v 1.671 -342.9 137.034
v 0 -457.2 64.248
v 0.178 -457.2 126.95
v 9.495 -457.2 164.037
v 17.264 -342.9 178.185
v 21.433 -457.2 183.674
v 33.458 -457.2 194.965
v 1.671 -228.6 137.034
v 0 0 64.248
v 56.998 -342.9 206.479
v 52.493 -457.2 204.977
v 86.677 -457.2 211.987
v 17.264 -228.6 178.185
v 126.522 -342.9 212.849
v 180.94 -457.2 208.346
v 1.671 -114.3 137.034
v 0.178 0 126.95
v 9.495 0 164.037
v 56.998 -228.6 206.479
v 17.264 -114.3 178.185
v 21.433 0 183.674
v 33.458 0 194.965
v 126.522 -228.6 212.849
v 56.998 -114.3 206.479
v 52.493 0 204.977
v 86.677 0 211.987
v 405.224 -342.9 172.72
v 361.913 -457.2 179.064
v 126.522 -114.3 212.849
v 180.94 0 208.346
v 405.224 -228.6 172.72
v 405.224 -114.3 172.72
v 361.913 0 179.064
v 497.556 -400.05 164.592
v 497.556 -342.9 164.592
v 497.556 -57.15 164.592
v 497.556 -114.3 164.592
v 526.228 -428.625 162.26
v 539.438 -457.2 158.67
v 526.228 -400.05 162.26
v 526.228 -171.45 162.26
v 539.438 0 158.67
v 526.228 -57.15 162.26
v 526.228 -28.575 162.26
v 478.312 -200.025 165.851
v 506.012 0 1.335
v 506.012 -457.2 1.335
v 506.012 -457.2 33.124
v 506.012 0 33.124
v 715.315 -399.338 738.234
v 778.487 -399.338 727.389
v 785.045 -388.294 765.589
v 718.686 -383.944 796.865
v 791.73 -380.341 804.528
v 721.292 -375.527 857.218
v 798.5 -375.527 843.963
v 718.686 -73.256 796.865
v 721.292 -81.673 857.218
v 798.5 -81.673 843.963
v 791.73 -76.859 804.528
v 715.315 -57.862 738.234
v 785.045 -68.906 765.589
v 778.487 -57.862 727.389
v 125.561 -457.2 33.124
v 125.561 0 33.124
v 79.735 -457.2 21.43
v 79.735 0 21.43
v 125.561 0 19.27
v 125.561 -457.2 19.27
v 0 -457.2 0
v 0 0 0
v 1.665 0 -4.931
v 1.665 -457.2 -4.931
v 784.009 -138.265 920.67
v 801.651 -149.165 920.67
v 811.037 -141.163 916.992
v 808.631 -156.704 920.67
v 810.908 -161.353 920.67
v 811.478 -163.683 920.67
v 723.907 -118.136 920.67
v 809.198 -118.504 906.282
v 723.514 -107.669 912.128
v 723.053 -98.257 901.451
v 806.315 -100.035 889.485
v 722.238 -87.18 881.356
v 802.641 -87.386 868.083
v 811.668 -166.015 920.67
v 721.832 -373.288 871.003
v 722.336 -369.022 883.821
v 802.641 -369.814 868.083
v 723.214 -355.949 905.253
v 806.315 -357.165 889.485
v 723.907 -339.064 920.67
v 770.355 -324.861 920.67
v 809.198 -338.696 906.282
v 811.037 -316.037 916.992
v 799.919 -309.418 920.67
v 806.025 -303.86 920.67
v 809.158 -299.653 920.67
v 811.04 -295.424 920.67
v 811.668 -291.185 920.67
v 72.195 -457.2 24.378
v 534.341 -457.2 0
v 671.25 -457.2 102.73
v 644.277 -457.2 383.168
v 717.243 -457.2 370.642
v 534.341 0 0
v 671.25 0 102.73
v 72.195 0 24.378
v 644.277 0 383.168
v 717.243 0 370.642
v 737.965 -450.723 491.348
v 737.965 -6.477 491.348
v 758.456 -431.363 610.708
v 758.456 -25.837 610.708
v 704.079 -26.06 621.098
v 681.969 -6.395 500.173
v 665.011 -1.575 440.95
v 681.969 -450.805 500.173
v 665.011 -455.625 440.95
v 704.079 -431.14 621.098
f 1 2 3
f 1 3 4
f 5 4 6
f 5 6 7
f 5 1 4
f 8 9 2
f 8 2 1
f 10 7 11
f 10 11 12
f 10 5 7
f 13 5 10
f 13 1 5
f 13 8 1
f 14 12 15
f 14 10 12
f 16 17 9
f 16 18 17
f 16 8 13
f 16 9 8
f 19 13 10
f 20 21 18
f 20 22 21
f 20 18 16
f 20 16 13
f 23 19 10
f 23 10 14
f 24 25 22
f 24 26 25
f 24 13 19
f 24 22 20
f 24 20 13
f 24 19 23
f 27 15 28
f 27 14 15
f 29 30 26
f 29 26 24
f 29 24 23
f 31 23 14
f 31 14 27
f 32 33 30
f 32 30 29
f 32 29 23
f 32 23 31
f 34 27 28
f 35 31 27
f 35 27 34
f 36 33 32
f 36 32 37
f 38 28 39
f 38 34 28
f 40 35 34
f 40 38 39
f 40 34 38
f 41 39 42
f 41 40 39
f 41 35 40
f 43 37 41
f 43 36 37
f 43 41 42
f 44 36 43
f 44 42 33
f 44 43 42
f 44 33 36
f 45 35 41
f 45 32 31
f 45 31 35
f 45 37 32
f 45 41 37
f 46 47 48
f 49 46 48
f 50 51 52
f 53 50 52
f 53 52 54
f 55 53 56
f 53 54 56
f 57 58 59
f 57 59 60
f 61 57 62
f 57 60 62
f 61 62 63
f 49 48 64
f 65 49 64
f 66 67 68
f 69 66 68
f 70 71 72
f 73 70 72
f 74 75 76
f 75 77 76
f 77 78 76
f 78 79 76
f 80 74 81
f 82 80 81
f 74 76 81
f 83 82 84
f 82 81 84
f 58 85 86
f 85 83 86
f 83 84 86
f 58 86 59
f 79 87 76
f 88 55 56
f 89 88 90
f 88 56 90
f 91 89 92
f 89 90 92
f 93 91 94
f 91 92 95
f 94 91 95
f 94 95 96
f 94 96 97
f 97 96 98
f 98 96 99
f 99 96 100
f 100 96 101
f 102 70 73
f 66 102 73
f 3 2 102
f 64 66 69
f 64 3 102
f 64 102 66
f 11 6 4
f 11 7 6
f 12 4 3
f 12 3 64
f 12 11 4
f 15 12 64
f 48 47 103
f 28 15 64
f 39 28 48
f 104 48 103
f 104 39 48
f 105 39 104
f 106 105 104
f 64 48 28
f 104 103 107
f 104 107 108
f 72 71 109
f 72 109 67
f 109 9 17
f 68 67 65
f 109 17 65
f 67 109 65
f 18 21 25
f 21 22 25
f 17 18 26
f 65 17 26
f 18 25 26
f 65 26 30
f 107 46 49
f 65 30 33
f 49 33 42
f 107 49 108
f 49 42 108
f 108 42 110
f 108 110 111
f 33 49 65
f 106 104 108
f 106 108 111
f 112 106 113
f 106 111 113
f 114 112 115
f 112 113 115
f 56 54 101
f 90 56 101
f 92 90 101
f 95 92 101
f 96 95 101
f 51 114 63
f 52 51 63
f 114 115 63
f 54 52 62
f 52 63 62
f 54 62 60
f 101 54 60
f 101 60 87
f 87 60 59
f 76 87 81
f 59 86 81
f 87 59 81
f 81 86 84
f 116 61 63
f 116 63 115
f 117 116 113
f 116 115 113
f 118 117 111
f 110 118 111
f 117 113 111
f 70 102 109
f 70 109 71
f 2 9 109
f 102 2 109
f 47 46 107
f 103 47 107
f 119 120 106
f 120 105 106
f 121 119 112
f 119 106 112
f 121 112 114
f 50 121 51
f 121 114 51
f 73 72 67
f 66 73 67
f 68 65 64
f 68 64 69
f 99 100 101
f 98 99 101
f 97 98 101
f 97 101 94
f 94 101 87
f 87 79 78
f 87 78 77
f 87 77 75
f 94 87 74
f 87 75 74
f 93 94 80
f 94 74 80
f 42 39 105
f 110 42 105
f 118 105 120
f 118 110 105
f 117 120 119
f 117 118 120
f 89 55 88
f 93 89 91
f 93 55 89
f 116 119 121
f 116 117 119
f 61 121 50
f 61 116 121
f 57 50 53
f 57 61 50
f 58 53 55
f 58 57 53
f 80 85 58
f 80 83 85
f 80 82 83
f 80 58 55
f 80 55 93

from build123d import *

# Parameters (mm, degrees)
F1_DEPTH = 457.2
F3_DEPTH = 801.4134901234
F5_DEPTH = 457.2010007


with BuildPart() as f1:
    # F0 (on Front) → F1 (new body)
    with BuildSketch(Plane.XZ):
        with BuildLine():
            Line((72.1953528447, 24.3776747791), (0, 0))
            Line((0, 0), (1.6650223942, -4.9310231731))
            Line((1.6650223942, -4.9310231731), (79.7350087536, 21.4302959768))
            Line((79.7350087536, 21.4302959768), (534.3410968781, 0))
            Line((534.3410968781, 0), (671.2495088577, 102.7298867702))
            Line((671.2495088577, 102.7298867702), (811.6683363914, 920.6699728966))
            Line((811.6683363914, 920.6699728966), (723.9065766335, 920.6699728966))
            add(Edge.make_bspline(
                [(539.437549965, 158.6699728966), (585.7215115369, 256.2591998048), (715.9314216301, 483.423683833), (718.7762170579, 812.4158484392), (723.9065766335, 920.6699728966)],
                knots=[0, 0, 0, 0, 0.4829237954, 1, 1, 1, 1], degree=3))
            add(Edge.make_bspline(
                [(0, 64.2480548378), (-1.0674535771, 81.5639641635), (-4.6642067148, 126.5442777853), (32.2297632664, 255.4594005166), (389.0875327927, 160.4925329149), (533.4, 165.1), (539.437549965, 158.6699728966)],
                knots=[0, 0, 0, 0, 0.1631919362, 0.3626127441, 0.7576485588, 1, 1, 1, 1], degree=3))
            Line((0, 64.2480548378), (72.1953528447, 24.3776747791))
        make_face()
    extrude(amount=F1_DEPTH)

    # F2 (on face) → F3 (cut, through all)
    with BuildSketch(Plane(origin=(634.9017438314, 0, -108.9959521242), x_dir=(0, 1, 0), z_dir=(0.9855819877, 0, -0.1691985385))):
        with BuildLine():
            ThreePointArc((-375.5267318941, 966.9000818866), (-348.5668963422, 1022.298693149), (-291.1846041679, 1044.7288382132))
            Line((-291.1846041679, 1044.7288382132), (-457.2, 1044.7288382132))
            Line((-457.2, 1044.7288382132), (-457.2, 486.6543970002))
            ThreePointArc((-457.2, 486.6543970002), (-442.6431884201, 669.9353069041), (-399.337754083, 848.620594646))
            ThreePointArc((-399.337754083, 848.620594646), (-383.9278993815, 907.0548735629), (-375.5267318941, 966.9000818866))
        make_face()
        with BuildLine():
            Line((0, 1044.7288382132), (-166.0153958321, 1044.7288382132))
            ThreePointArc((-166.0153958321, 1044.7288382132), (-108.6331036578, 1022.298693149), (-81.6732681059, 966.9000818866))
            ThreePointArc((-81.6732681059, 966.9000818866), (-73.2721006185, 907.0548735629), (-57.862245917, 848.620594646))
            ThreePointArc((-57.862245917, 848.620594646), (-14.5568115799, 669.9353069041), (0, 486.6543970002))
            Line((0, 486.6543970002), (0, 1044.7288382132))
        make_face()
    extrude(amount=-F3_DEPTH, mode=Mode.SUBTRACT)

    # F4 (on face) → F5 (cut, through all)
    with BuildSketch(Plane.XZ.offset(457.2)):
        Polygon((506.0118436813, 33.1242606044), (125.5606561899, 33.1242606044), (125.5606561899, 19.2700583259), (506.0118436813, 1.3354512768), align=None)
    extrude(amount=-F5_DEPTH, mode=Mode.SUBTRACT)


solid = f1.part
